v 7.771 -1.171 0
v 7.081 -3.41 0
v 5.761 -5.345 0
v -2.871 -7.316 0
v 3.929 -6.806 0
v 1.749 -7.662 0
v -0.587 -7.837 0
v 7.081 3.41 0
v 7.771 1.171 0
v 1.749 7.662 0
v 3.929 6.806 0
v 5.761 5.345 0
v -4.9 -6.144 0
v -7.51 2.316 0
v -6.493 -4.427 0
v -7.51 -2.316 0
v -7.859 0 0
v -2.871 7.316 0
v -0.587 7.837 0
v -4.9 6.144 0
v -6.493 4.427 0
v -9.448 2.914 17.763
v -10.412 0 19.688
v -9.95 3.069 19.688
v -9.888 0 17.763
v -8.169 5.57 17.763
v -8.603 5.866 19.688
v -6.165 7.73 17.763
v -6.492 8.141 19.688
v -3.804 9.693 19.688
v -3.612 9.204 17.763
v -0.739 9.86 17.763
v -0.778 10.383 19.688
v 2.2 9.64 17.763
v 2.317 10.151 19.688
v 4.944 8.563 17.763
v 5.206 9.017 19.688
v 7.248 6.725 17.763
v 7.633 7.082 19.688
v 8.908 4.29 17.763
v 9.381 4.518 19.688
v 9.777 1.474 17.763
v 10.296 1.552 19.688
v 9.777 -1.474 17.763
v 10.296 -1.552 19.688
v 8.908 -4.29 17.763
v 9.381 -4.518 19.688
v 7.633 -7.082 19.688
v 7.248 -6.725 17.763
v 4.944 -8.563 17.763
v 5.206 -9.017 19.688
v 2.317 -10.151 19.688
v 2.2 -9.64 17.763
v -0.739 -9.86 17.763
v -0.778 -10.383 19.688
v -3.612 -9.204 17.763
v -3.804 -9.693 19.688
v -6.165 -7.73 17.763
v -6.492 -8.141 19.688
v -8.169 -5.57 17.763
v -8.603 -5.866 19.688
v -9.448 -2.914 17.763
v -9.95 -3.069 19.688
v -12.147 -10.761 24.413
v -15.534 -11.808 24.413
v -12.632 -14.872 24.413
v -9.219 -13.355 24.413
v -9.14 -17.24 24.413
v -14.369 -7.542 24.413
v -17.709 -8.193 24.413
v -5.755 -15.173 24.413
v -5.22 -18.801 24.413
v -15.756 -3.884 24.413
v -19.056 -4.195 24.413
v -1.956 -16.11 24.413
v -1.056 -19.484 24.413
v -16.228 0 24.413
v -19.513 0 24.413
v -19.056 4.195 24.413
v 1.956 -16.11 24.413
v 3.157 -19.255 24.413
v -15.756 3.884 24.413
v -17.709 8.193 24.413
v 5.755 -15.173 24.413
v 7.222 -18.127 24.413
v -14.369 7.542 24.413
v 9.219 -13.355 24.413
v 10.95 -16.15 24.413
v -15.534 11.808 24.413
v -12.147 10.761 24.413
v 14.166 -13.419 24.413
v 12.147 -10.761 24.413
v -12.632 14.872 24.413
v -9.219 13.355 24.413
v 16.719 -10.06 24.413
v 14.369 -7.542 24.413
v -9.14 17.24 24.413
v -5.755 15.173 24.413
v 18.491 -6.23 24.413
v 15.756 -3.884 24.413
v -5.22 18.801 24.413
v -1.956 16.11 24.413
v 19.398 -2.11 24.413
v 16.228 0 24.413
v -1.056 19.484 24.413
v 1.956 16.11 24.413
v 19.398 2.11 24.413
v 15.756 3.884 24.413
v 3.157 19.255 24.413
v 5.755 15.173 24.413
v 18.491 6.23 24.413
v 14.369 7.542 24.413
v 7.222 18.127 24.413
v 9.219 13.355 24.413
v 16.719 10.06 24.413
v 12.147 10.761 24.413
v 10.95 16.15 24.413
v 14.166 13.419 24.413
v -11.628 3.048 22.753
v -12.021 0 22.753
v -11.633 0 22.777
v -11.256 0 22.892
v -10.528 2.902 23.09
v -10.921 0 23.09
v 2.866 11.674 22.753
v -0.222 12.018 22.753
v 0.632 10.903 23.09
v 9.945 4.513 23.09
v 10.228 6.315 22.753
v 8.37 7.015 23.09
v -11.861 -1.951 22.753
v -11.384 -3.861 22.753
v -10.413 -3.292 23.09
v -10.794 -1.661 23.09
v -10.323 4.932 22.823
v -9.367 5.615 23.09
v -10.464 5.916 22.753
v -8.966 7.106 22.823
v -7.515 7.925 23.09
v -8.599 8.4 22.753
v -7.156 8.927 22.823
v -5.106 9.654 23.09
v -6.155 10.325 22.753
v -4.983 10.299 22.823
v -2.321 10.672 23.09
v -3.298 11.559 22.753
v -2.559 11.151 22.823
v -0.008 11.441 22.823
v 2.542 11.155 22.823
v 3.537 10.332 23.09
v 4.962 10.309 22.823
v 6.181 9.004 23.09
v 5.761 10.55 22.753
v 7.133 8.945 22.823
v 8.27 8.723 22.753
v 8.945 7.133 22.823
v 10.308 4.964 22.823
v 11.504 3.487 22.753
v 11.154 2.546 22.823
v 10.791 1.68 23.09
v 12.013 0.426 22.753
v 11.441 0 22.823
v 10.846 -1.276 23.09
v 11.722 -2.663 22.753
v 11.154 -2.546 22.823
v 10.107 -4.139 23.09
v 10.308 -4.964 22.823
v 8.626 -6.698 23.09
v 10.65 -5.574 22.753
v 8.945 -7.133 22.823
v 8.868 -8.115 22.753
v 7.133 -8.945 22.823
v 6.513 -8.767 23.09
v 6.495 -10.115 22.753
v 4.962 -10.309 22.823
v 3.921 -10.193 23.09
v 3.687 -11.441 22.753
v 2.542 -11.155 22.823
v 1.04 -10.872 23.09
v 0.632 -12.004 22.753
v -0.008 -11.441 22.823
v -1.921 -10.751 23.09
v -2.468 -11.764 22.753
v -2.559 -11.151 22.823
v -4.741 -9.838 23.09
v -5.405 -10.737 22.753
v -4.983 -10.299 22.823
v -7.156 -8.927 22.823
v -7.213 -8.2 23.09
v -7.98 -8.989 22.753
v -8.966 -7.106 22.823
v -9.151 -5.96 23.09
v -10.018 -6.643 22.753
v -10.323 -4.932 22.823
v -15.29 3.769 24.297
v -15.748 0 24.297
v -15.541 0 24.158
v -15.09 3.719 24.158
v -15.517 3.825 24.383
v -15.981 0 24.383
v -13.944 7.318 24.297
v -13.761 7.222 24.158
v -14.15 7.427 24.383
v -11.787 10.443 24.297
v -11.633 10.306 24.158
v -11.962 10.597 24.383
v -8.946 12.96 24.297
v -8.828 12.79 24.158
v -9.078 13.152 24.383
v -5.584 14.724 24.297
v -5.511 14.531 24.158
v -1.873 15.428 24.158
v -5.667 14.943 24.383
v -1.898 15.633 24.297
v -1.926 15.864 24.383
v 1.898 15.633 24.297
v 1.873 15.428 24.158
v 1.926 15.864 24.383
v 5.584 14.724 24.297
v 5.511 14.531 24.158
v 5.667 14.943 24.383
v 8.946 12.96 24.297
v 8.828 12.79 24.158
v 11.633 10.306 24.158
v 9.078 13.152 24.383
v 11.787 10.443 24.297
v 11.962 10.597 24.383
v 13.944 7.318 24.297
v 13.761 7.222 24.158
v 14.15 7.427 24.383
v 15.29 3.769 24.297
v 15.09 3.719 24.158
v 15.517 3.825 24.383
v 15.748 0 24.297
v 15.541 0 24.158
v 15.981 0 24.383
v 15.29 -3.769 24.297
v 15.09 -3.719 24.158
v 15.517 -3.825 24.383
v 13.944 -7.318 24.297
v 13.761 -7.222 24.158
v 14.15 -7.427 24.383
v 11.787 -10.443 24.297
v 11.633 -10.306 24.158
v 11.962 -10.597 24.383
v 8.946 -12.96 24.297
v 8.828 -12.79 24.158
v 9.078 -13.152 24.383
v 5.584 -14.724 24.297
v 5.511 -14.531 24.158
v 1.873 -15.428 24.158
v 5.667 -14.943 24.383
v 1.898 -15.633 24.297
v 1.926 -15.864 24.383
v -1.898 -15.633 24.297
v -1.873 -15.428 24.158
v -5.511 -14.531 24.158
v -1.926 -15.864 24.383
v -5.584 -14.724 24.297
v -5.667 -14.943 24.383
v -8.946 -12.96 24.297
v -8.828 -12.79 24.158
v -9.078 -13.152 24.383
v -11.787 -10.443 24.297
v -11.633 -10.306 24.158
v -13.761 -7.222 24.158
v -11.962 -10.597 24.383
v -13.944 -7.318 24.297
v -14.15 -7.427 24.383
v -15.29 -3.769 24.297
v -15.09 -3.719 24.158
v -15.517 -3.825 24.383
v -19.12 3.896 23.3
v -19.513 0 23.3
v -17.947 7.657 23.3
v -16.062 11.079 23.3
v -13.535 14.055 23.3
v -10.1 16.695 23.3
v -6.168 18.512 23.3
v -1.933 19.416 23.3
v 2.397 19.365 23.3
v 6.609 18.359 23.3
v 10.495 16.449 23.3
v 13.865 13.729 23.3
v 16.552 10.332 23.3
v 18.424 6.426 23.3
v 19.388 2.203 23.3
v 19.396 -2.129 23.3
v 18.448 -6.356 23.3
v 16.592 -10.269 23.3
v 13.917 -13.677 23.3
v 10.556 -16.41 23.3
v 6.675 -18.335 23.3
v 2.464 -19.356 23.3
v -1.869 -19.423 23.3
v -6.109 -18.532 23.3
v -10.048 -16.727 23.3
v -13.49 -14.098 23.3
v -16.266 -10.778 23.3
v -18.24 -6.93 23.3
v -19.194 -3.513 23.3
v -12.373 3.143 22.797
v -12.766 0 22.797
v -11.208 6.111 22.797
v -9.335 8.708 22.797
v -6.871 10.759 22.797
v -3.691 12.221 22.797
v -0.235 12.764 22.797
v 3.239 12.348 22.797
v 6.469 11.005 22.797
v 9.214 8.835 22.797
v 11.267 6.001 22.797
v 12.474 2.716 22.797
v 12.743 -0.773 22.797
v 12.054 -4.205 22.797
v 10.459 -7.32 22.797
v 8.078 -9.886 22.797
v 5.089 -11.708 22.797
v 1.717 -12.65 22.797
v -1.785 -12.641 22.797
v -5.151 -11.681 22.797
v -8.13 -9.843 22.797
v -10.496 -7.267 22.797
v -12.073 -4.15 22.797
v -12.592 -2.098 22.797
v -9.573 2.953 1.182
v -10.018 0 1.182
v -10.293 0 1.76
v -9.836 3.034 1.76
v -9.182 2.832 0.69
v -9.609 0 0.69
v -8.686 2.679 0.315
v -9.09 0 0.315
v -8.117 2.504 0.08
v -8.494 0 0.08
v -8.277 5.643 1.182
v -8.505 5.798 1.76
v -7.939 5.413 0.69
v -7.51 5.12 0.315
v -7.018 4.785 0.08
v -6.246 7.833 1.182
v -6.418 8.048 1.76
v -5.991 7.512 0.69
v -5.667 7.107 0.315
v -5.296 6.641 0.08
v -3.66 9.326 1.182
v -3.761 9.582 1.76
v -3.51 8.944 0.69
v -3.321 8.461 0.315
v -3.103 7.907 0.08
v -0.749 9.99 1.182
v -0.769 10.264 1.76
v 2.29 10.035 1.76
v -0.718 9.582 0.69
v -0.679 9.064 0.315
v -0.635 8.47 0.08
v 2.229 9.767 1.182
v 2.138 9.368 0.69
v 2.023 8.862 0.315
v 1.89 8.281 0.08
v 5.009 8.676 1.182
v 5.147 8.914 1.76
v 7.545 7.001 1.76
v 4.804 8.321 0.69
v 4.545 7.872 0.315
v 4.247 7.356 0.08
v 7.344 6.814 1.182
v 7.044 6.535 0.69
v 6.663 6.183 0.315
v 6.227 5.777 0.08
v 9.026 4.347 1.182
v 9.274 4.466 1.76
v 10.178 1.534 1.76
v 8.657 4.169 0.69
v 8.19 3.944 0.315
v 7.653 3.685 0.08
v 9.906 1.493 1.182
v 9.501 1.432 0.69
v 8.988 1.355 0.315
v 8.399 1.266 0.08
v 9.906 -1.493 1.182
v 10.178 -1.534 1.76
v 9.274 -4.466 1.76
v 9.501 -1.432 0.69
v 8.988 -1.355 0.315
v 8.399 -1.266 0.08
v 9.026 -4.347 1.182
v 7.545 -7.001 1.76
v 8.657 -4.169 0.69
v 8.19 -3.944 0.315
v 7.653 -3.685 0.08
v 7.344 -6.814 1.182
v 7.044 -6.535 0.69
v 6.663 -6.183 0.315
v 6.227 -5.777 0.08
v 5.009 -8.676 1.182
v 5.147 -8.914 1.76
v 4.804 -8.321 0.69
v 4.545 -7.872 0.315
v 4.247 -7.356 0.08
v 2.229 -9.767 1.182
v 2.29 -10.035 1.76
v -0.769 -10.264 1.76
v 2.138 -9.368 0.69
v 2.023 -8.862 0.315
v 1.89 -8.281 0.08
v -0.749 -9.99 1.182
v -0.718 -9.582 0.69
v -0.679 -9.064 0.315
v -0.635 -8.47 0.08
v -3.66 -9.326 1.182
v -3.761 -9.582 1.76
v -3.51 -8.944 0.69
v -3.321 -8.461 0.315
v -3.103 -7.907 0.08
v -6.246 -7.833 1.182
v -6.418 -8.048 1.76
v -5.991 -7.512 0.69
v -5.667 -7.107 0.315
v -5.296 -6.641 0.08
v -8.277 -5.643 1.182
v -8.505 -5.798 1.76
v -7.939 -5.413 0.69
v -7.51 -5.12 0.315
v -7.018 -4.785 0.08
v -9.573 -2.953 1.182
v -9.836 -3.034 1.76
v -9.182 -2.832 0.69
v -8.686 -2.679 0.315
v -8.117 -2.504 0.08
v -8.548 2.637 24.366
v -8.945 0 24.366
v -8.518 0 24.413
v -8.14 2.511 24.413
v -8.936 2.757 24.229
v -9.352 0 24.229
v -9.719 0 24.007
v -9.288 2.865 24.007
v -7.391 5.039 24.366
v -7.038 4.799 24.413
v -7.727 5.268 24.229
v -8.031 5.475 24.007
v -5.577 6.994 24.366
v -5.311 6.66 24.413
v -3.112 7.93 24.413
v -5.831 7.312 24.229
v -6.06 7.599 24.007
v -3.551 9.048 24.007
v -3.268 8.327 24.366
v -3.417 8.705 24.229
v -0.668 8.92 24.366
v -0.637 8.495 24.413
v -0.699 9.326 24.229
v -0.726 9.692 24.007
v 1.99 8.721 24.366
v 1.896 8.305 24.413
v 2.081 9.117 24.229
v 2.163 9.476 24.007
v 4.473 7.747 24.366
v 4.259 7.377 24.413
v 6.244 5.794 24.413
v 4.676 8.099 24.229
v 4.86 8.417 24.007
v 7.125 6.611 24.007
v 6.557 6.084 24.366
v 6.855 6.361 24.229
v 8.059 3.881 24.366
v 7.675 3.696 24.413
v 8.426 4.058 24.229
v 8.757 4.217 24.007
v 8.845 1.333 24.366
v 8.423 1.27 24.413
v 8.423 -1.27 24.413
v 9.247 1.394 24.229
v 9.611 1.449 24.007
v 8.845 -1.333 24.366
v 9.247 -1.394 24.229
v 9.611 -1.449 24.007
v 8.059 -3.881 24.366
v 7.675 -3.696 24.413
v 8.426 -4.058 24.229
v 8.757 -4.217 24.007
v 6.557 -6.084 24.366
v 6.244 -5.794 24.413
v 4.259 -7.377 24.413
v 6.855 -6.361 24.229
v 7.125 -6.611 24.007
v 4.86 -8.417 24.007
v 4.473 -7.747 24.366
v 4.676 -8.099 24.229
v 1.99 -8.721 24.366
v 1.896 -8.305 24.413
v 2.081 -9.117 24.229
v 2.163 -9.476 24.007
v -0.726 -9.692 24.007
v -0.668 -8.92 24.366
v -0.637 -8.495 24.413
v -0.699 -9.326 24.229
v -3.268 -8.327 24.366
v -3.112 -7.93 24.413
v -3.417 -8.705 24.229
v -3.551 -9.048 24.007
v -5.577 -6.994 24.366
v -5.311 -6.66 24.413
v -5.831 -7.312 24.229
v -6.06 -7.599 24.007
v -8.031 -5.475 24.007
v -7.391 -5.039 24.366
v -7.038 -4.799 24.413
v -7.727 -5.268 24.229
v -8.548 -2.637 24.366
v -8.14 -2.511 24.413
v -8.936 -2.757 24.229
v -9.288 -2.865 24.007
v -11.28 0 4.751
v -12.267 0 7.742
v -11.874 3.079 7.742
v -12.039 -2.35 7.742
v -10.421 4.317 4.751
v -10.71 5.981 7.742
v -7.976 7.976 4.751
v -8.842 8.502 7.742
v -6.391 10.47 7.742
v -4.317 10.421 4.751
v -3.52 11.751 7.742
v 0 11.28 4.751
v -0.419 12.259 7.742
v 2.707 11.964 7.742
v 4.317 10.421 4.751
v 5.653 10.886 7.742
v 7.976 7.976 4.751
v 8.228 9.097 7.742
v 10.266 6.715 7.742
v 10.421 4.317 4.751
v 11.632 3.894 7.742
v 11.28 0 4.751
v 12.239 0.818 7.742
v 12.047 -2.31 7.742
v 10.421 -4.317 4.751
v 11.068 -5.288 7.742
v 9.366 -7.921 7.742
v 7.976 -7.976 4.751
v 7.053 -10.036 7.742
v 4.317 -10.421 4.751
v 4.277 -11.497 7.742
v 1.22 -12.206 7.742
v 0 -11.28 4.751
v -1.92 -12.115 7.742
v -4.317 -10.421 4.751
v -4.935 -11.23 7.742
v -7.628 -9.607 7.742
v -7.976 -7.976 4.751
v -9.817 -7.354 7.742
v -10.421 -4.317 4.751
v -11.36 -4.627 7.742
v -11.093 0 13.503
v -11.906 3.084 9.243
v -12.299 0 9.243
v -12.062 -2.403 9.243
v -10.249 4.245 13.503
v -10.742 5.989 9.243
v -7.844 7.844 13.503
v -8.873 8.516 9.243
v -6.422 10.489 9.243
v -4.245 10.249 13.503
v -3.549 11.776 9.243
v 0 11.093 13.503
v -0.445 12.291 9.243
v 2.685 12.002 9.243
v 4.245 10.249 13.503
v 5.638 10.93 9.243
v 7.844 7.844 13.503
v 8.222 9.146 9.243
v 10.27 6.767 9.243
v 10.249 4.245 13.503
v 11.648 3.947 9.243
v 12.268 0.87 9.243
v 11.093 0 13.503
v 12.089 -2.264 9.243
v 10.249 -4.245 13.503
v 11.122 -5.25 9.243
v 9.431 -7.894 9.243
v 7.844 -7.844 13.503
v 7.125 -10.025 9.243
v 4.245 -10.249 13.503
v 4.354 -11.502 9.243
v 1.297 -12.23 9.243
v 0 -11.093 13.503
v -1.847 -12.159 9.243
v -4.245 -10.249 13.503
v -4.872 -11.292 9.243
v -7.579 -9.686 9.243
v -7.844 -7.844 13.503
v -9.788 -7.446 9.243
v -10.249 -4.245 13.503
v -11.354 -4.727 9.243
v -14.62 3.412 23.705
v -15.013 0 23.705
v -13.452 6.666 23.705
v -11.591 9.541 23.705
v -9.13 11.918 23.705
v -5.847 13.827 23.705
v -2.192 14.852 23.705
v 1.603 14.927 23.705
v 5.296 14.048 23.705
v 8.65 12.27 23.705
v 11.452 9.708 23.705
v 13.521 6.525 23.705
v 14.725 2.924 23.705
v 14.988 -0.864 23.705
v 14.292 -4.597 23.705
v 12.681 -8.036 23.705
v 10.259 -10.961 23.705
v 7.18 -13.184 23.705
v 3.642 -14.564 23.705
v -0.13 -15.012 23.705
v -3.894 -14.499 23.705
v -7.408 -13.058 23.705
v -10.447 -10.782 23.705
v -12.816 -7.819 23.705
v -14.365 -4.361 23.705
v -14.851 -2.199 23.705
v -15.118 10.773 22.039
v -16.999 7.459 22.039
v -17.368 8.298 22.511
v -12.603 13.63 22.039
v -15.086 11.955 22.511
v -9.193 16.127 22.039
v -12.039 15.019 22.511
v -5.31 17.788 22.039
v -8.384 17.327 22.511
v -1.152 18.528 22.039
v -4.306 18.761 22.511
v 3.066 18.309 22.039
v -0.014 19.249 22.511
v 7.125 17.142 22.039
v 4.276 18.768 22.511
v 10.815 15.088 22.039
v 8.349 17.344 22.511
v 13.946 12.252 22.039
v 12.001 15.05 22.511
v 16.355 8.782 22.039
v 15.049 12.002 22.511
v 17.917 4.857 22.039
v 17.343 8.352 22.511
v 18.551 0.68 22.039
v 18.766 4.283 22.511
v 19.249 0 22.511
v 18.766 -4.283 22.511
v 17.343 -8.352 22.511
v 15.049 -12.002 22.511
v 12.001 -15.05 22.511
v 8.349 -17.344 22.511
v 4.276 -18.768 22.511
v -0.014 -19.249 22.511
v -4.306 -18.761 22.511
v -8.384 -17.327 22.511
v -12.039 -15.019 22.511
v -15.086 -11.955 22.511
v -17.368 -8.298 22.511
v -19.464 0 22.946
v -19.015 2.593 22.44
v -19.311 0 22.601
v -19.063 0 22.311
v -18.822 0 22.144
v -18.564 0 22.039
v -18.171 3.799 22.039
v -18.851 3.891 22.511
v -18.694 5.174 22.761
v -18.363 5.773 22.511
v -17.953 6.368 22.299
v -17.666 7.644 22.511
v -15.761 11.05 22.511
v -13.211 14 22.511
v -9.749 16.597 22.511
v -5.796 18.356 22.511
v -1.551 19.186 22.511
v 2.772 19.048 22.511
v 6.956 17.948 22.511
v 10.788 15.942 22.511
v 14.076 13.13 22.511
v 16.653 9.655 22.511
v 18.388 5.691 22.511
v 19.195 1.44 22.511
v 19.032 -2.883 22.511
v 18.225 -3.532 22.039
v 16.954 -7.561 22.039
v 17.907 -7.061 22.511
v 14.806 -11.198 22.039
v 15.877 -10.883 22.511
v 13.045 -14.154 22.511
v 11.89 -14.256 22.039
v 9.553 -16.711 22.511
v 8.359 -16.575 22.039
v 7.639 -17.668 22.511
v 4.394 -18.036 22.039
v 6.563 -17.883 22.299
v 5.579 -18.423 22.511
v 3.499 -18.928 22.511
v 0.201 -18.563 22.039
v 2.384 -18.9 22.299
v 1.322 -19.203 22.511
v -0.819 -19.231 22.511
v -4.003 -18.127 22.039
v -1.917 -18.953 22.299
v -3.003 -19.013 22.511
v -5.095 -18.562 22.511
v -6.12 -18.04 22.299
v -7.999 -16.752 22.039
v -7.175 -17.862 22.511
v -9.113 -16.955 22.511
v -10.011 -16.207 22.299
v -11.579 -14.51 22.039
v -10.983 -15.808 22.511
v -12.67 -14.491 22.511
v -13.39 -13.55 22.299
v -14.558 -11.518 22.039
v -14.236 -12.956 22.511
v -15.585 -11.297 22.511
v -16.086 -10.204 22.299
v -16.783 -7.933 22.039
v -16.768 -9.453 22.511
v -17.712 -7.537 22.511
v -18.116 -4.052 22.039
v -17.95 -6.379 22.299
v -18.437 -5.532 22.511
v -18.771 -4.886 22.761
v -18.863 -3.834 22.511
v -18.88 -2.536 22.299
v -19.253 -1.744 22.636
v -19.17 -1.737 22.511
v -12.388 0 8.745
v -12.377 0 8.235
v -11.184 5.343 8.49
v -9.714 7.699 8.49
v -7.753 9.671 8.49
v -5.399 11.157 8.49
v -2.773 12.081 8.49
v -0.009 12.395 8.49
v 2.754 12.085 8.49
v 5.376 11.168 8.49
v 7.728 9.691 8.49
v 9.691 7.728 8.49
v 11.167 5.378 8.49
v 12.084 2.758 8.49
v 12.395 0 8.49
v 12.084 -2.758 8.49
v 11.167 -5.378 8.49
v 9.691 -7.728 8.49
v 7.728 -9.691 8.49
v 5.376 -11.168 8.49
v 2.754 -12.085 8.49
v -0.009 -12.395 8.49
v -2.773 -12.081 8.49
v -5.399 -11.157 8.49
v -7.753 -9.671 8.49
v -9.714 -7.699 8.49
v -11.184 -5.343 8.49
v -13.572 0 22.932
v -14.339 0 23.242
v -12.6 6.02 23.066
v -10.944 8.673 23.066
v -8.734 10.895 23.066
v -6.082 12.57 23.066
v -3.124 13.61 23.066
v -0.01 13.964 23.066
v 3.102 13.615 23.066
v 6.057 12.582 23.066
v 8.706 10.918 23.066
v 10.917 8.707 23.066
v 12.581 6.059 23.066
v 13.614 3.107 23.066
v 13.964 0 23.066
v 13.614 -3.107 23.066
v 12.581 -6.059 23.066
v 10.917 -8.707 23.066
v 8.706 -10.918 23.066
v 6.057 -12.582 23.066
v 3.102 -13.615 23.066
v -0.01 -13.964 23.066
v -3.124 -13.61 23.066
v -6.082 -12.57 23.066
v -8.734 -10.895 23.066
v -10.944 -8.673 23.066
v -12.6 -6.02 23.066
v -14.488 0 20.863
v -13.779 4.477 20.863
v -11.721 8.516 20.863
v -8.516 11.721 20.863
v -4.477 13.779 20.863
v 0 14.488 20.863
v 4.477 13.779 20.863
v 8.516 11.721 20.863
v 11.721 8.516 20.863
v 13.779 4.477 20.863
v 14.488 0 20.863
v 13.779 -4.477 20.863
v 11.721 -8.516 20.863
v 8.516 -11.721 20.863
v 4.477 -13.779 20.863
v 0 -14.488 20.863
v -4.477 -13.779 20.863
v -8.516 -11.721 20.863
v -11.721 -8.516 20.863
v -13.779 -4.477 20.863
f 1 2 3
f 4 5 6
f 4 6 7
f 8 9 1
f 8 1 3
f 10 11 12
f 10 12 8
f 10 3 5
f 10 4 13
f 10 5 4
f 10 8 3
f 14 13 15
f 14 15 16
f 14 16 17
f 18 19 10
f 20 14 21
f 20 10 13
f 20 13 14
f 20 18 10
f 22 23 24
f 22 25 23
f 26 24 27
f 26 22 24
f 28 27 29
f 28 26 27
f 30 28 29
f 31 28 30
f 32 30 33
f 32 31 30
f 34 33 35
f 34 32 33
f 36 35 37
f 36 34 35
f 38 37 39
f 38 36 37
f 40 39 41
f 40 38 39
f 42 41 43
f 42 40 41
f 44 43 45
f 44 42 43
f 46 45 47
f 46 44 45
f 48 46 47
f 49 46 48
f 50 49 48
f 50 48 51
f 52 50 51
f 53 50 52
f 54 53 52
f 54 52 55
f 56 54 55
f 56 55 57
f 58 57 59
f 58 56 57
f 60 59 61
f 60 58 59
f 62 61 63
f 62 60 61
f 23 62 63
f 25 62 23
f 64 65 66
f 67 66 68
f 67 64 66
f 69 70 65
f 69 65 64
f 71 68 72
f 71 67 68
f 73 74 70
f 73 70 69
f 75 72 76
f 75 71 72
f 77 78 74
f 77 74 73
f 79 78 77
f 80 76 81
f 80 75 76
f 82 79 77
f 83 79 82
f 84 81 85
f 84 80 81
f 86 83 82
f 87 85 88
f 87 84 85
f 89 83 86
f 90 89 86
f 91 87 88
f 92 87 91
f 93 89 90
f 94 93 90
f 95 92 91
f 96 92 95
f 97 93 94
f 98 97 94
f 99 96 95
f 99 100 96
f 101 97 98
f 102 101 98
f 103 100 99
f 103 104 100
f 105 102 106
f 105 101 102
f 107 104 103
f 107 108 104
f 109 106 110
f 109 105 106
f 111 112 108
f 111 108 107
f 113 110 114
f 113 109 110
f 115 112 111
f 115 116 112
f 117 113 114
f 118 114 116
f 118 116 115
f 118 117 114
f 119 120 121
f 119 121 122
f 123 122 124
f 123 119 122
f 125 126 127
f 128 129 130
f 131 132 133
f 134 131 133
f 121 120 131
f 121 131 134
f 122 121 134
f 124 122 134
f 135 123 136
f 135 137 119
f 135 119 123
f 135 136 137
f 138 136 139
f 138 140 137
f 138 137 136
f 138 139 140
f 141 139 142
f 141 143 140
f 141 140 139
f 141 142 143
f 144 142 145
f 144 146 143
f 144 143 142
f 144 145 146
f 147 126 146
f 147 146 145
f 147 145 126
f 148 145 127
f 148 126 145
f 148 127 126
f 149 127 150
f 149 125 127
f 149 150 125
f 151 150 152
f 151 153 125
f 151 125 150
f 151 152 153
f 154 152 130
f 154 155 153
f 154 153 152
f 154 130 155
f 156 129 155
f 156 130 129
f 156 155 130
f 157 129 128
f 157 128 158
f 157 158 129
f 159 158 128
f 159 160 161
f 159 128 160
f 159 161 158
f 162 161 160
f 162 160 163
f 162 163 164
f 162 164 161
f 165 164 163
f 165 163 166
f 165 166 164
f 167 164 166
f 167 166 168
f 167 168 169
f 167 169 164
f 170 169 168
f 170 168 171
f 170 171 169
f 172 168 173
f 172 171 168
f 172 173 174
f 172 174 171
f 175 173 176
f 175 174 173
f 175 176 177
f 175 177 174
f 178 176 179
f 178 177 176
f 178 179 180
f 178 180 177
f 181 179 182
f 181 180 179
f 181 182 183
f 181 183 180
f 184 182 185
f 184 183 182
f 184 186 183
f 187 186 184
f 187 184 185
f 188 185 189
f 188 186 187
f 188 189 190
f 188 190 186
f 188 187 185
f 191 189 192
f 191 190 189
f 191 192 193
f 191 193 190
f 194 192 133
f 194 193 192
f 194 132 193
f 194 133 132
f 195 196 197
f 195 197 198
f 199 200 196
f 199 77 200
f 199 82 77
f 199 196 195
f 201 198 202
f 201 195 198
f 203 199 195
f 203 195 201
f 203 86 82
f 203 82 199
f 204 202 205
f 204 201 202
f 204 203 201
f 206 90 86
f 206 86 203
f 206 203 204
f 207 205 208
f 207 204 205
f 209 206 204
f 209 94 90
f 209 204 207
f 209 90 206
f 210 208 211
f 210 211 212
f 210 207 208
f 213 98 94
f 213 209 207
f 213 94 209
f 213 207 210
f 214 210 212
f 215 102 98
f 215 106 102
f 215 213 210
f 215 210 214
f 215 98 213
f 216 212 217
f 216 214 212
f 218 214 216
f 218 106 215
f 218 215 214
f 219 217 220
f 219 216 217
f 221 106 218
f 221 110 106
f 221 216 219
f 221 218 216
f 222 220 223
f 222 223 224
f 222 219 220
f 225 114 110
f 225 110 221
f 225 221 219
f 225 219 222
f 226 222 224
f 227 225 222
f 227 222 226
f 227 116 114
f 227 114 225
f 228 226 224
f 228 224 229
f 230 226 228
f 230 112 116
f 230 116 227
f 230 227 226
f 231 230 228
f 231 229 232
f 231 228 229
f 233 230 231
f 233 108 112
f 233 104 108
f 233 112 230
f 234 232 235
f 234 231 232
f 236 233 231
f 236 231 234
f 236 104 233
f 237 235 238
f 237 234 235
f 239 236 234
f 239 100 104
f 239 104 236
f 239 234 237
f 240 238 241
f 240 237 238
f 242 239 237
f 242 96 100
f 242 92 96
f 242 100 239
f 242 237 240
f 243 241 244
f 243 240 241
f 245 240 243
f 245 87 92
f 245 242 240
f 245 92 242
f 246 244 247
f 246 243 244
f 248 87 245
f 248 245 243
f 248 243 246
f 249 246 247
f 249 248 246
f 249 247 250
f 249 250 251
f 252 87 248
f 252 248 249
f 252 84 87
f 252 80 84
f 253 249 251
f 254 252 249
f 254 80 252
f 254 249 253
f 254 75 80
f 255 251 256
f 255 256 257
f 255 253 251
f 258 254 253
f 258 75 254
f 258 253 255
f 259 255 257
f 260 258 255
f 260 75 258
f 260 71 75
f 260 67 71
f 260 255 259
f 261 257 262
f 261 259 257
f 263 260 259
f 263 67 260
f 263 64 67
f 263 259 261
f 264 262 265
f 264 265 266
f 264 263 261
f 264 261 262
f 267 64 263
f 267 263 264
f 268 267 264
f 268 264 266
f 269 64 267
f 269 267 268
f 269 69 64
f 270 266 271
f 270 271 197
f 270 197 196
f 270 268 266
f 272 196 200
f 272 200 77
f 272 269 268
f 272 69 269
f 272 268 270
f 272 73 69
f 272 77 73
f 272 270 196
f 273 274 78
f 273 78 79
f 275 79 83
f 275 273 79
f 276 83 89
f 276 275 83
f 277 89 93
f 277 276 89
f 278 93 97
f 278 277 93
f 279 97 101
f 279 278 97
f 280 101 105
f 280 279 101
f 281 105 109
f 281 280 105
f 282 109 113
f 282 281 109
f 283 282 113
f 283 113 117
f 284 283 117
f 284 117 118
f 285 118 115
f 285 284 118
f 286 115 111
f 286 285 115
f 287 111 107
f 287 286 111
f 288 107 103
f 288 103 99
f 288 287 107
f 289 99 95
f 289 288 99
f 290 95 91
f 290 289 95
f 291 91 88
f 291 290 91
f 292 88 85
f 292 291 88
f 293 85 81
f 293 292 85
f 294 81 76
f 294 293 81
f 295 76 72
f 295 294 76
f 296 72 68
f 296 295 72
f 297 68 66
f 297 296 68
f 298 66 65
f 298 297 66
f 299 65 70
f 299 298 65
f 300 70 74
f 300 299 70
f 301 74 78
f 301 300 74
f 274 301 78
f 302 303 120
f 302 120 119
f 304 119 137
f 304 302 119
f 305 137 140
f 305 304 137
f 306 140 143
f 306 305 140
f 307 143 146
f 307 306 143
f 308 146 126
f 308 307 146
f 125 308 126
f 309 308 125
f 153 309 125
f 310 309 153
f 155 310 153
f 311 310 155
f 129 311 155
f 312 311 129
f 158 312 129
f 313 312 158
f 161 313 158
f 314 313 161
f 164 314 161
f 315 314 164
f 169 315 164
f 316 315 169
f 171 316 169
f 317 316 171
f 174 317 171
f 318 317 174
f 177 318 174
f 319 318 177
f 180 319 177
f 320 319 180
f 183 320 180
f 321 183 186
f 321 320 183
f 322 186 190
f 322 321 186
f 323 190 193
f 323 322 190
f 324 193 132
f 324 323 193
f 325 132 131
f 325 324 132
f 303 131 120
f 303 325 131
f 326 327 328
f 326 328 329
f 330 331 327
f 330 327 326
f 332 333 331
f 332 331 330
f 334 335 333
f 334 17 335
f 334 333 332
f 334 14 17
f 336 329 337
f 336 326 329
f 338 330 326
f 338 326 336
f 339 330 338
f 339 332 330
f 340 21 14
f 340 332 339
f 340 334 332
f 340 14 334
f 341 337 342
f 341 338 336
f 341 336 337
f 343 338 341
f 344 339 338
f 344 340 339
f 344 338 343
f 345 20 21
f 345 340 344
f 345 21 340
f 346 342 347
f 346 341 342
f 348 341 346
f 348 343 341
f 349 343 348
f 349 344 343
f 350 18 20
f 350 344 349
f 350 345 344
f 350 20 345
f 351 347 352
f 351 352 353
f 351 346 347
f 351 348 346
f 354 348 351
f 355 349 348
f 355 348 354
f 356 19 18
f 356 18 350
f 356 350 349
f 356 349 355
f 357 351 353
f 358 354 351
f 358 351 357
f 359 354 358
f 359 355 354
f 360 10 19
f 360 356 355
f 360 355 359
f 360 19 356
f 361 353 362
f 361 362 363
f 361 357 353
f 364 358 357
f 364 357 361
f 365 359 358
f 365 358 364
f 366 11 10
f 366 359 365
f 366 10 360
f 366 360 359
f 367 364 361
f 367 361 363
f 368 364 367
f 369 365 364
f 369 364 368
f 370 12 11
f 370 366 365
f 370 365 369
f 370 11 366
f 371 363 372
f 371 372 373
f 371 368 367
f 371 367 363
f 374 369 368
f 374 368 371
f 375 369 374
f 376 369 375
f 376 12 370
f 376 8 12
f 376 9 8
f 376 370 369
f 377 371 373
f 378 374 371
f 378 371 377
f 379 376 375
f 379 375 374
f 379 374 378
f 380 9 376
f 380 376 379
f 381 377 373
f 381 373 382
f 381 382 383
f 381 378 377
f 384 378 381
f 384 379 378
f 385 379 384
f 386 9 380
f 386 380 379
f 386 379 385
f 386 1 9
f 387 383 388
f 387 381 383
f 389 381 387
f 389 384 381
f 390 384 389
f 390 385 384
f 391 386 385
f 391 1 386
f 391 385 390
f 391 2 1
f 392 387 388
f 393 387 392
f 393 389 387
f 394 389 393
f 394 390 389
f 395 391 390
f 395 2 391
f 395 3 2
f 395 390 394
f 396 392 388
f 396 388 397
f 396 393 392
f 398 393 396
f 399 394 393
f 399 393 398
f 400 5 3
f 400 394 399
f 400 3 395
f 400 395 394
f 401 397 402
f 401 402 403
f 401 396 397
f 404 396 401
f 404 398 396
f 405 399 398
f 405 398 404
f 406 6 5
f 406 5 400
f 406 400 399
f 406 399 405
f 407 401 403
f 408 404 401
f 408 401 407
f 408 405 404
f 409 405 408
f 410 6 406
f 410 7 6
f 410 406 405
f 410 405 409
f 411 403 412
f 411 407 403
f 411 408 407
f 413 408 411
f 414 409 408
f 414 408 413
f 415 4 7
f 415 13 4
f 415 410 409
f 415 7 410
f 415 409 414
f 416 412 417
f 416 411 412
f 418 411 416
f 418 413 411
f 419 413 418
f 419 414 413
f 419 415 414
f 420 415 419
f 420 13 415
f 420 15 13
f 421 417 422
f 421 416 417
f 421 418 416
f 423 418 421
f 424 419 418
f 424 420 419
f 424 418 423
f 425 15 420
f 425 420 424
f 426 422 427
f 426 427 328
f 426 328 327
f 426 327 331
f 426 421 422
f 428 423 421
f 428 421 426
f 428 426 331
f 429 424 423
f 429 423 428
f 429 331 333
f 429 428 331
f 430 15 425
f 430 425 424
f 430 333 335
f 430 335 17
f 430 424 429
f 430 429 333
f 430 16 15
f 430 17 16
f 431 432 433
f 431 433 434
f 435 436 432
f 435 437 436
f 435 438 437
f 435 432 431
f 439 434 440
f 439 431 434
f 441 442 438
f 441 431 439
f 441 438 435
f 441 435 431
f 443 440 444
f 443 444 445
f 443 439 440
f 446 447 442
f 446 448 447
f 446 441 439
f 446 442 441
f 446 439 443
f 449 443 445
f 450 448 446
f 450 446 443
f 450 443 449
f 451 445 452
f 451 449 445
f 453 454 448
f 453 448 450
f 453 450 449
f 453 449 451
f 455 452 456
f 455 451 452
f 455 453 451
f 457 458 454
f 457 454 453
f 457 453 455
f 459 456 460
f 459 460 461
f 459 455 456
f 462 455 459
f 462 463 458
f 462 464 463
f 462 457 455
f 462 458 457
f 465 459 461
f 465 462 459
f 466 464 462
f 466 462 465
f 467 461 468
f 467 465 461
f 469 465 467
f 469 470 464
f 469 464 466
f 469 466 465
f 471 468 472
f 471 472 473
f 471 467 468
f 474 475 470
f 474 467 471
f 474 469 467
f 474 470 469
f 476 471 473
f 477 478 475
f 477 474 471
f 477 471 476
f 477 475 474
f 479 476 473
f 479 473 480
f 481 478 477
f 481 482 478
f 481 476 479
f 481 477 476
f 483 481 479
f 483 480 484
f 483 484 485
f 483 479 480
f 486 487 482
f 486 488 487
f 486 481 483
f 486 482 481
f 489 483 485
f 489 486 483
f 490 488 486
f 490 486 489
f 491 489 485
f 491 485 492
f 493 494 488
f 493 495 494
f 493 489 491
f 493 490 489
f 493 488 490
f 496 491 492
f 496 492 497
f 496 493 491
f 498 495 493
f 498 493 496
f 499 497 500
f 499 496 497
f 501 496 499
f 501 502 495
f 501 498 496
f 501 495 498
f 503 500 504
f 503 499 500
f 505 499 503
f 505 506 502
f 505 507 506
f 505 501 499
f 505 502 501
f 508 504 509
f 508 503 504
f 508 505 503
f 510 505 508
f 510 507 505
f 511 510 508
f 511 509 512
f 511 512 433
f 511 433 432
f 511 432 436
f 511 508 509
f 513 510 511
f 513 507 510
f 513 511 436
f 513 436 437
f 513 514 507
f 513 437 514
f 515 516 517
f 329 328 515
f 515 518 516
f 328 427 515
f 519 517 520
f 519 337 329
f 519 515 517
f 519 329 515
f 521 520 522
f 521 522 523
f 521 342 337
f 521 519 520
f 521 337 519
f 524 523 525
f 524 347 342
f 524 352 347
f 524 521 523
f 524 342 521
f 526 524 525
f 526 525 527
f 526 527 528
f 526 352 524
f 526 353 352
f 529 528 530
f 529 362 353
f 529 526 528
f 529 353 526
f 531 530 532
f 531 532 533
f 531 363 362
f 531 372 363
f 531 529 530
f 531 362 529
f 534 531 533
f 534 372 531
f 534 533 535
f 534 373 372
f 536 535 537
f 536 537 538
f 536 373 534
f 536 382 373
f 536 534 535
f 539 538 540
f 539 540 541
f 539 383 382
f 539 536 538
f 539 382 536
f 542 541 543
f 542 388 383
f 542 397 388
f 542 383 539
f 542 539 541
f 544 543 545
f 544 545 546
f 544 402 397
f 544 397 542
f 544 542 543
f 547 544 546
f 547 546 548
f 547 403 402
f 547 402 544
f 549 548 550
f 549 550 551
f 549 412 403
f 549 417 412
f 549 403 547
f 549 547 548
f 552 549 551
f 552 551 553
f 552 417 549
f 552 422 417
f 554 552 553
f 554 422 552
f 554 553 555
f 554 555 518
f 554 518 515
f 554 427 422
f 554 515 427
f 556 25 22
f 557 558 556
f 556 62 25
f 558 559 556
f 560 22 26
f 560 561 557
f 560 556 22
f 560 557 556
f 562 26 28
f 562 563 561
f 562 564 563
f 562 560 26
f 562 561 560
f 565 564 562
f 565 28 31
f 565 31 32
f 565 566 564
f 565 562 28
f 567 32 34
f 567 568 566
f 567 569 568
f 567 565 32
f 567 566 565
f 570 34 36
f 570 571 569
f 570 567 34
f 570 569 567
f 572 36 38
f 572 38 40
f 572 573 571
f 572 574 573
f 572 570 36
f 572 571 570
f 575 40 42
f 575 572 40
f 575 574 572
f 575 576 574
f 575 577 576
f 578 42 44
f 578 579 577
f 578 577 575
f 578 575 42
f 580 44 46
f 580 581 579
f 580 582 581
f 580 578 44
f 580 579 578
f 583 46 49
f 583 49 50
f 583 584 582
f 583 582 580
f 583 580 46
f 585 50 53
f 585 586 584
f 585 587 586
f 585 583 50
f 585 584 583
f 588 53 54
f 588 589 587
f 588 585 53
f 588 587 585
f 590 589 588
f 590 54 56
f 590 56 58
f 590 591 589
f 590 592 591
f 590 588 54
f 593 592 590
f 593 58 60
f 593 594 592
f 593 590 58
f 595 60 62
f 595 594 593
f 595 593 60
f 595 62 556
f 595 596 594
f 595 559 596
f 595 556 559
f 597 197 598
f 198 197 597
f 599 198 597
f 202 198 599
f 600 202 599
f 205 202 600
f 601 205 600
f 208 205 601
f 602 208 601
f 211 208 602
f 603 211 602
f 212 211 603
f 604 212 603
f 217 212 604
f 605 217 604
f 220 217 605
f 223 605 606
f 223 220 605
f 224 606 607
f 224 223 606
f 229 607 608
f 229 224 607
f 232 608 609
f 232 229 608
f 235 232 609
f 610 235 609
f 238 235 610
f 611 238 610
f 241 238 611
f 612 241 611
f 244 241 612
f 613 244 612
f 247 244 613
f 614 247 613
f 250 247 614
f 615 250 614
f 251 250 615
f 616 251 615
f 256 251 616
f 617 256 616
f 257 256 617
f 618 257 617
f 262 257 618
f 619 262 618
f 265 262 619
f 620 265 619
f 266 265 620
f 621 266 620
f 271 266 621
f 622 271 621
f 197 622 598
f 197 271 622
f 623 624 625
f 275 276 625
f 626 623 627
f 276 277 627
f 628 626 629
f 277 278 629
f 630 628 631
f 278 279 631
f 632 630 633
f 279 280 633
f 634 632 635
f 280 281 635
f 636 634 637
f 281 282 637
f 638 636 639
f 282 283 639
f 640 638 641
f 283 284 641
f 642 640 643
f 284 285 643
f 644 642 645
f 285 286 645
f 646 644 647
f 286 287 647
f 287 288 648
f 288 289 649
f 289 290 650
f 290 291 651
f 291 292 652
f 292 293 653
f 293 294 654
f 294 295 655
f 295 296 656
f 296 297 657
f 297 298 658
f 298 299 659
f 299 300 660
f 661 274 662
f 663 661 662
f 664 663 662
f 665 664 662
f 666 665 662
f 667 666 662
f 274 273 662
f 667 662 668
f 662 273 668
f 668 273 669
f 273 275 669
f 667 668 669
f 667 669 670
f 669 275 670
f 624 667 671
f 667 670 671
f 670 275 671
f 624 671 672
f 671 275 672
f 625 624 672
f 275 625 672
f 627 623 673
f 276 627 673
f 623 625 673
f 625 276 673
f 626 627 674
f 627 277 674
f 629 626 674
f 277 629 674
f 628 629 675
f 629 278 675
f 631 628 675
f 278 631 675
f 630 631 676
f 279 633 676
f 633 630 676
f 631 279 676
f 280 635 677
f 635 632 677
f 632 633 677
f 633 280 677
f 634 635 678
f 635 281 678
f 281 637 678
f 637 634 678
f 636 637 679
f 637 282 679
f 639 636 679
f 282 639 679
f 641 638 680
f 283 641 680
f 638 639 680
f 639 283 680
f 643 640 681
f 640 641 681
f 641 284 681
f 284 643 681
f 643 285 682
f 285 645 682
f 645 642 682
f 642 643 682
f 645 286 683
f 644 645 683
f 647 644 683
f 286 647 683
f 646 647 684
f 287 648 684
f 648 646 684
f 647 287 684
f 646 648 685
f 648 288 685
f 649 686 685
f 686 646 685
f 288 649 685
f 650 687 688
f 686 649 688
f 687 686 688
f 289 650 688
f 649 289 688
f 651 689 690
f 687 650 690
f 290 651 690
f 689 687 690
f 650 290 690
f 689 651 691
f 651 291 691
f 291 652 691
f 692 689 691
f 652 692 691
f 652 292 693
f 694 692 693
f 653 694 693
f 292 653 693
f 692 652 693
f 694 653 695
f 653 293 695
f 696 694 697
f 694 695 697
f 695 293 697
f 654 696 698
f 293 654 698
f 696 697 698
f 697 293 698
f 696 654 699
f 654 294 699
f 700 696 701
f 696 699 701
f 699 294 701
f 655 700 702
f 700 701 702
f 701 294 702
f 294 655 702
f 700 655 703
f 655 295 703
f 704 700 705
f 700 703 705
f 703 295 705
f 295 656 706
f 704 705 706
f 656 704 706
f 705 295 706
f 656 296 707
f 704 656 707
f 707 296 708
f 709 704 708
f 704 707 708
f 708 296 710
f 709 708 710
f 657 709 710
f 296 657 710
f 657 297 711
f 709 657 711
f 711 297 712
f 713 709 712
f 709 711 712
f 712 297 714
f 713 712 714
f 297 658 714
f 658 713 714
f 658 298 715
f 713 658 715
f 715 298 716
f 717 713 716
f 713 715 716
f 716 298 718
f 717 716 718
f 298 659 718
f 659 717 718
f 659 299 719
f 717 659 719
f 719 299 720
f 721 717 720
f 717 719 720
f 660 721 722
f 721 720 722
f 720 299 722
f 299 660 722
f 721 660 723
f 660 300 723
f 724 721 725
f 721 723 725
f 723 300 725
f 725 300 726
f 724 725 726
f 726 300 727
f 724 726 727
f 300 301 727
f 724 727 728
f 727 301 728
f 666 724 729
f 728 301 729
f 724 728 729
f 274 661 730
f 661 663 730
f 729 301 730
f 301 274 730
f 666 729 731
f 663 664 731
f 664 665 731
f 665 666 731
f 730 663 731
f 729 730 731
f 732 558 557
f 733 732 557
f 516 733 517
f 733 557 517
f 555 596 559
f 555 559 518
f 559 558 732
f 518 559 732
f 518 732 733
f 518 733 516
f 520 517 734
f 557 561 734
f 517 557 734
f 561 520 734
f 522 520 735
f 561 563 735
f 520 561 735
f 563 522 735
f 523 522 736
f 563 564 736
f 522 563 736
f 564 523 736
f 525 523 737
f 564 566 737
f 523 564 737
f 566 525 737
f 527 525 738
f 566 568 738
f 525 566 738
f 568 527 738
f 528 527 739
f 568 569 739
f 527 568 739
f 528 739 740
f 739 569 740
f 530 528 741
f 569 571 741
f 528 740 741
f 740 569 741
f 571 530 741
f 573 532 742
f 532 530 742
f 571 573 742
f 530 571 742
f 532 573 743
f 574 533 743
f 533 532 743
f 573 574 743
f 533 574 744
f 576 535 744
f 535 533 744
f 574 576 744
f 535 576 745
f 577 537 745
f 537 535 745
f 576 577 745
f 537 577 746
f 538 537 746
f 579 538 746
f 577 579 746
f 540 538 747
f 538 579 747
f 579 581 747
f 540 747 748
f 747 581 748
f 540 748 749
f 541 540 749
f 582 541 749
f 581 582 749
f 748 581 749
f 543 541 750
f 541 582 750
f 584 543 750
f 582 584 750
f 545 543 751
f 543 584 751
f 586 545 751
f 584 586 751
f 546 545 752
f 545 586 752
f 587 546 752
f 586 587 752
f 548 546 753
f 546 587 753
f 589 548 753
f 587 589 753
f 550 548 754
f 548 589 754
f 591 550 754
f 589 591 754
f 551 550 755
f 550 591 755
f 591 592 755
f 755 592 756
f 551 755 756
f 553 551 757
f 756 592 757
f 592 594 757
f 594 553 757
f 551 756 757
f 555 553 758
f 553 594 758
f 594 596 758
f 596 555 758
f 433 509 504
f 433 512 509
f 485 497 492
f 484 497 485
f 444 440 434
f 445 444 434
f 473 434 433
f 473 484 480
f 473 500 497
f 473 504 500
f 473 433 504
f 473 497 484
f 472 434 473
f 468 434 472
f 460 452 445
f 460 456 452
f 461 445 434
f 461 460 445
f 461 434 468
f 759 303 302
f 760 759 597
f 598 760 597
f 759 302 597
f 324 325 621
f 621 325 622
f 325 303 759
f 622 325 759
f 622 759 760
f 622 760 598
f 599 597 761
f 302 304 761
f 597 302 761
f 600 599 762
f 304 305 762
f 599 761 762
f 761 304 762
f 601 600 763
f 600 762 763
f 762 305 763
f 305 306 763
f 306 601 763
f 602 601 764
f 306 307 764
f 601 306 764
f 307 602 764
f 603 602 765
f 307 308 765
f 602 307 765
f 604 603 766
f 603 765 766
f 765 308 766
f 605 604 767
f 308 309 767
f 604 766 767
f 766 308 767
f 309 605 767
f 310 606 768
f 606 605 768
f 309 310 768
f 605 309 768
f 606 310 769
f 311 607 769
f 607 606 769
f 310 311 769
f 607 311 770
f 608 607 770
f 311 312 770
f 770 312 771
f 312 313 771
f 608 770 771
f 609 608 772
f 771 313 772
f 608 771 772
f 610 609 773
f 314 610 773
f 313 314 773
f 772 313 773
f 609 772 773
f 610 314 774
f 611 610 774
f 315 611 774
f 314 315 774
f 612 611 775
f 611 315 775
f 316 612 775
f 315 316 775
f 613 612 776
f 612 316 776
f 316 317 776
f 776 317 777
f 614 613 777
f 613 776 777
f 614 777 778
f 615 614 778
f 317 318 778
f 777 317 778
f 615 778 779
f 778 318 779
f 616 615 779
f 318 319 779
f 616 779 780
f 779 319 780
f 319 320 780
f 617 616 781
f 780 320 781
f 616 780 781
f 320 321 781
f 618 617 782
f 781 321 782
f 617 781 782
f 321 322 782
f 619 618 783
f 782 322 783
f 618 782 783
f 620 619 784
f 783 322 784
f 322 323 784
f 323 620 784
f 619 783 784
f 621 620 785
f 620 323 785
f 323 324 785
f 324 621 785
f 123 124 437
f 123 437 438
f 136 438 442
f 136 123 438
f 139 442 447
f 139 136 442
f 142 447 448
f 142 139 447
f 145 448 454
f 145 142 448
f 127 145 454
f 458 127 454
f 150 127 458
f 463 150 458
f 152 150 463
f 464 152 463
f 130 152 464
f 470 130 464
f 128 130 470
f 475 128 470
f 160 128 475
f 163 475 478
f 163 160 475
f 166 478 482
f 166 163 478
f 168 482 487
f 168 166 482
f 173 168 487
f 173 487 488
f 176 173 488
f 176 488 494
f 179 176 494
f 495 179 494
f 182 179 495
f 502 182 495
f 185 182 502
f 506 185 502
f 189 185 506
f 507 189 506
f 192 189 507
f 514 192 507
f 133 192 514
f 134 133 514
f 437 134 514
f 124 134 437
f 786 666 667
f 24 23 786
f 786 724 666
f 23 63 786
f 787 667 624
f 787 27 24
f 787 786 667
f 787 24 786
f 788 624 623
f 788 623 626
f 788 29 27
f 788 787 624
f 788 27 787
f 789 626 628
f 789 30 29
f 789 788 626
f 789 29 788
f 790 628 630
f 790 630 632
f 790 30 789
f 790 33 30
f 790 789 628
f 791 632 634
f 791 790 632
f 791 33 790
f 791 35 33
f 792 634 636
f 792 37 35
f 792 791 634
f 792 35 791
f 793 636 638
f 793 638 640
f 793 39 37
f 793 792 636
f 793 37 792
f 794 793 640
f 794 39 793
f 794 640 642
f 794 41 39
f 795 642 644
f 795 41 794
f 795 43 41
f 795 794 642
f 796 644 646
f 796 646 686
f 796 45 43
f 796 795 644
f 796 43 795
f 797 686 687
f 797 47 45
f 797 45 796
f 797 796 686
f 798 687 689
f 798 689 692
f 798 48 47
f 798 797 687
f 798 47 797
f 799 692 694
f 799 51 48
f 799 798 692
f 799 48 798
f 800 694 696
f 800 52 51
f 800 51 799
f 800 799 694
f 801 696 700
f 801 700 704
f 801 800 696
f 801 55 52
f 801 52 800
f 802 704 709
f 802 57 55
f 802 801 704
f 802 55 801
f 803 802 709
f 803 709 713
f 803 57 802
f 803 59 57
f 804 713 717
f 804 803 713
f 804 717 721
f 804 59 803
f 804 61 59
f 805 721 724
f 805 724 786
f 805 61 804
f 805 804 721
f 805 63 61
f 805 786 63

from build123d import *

# Parameters (mm, degrees)
F2_R = 1.979654
F3_R = 3.788583
F4_R = 1.653235
F5_R = 1.054441
F6_R = 1.312708
F7_R = 2.563491


with BuildPart() as f1:
    # F0 (on Front) → F1 (revolve)
    with BuildSketch(Plane.XZ):
        Polygon((-9.7125, 0), (0, 0), (0, 24.412502), (-9.1875, 24.412502), (-11.408553, 22.717658), (-14.042635, 22.871565), (-15.8375, 24.412502), (-19.512501, 24.412502), (-19.512501, 22.312501), (-10.4125, 19.6875), (-9.8875, 17.762501), (-12.5125, 8.4875), align=None)
    revolve(axis=Axis((0, 0, 12.206251), (0, 0, -1)))

    # F2
    f2_edges = [f1.edges().sort_by_distance(p)[0] for p in [
        (9.1875, 0, 24.412502),
    ]]
    fillet(f2_edges, radius=F2_R)

    # F3
    f3_edges = [f1.edges().sort_by_distance(p)[0] for p in [
        (14.042635, 0, 22.871565),
    ]]
    fillet(f3_edges, radius=F3_R)

    # F4
    f4_edges = [f1.edges().sort_by_distance(p)[0] for p in [
        (11.408553, 0, 22.717658),
    ]]
    fillet(f4_edges, radius=F4_R)

    # F5
    f5_edges = [f1.edges().sort_by_distance(p)[0] for p in [
        (15.8375, 0, 24.412502),
    ]]
    fillet(f5_edges, radius=F5_R)

    # F6
    f6_edges = [f1.edges().sort_by_distance(p)[0] for p in [
        (19.512501, 0, 22.312501),
    ]]
    fillet(f6_edges, radius=F6_R)

    # F7
    f7_edges = [f1.edges().sort_by_distance(p)[0] for p in [
        (12.5125, 0, 8.4875),
        (9.7125, 0, 0),
        (-11.1125, 0, 4.24375),
    ]]
    fillet(f7_edges, radius=F7_R)


solid = f1.part
